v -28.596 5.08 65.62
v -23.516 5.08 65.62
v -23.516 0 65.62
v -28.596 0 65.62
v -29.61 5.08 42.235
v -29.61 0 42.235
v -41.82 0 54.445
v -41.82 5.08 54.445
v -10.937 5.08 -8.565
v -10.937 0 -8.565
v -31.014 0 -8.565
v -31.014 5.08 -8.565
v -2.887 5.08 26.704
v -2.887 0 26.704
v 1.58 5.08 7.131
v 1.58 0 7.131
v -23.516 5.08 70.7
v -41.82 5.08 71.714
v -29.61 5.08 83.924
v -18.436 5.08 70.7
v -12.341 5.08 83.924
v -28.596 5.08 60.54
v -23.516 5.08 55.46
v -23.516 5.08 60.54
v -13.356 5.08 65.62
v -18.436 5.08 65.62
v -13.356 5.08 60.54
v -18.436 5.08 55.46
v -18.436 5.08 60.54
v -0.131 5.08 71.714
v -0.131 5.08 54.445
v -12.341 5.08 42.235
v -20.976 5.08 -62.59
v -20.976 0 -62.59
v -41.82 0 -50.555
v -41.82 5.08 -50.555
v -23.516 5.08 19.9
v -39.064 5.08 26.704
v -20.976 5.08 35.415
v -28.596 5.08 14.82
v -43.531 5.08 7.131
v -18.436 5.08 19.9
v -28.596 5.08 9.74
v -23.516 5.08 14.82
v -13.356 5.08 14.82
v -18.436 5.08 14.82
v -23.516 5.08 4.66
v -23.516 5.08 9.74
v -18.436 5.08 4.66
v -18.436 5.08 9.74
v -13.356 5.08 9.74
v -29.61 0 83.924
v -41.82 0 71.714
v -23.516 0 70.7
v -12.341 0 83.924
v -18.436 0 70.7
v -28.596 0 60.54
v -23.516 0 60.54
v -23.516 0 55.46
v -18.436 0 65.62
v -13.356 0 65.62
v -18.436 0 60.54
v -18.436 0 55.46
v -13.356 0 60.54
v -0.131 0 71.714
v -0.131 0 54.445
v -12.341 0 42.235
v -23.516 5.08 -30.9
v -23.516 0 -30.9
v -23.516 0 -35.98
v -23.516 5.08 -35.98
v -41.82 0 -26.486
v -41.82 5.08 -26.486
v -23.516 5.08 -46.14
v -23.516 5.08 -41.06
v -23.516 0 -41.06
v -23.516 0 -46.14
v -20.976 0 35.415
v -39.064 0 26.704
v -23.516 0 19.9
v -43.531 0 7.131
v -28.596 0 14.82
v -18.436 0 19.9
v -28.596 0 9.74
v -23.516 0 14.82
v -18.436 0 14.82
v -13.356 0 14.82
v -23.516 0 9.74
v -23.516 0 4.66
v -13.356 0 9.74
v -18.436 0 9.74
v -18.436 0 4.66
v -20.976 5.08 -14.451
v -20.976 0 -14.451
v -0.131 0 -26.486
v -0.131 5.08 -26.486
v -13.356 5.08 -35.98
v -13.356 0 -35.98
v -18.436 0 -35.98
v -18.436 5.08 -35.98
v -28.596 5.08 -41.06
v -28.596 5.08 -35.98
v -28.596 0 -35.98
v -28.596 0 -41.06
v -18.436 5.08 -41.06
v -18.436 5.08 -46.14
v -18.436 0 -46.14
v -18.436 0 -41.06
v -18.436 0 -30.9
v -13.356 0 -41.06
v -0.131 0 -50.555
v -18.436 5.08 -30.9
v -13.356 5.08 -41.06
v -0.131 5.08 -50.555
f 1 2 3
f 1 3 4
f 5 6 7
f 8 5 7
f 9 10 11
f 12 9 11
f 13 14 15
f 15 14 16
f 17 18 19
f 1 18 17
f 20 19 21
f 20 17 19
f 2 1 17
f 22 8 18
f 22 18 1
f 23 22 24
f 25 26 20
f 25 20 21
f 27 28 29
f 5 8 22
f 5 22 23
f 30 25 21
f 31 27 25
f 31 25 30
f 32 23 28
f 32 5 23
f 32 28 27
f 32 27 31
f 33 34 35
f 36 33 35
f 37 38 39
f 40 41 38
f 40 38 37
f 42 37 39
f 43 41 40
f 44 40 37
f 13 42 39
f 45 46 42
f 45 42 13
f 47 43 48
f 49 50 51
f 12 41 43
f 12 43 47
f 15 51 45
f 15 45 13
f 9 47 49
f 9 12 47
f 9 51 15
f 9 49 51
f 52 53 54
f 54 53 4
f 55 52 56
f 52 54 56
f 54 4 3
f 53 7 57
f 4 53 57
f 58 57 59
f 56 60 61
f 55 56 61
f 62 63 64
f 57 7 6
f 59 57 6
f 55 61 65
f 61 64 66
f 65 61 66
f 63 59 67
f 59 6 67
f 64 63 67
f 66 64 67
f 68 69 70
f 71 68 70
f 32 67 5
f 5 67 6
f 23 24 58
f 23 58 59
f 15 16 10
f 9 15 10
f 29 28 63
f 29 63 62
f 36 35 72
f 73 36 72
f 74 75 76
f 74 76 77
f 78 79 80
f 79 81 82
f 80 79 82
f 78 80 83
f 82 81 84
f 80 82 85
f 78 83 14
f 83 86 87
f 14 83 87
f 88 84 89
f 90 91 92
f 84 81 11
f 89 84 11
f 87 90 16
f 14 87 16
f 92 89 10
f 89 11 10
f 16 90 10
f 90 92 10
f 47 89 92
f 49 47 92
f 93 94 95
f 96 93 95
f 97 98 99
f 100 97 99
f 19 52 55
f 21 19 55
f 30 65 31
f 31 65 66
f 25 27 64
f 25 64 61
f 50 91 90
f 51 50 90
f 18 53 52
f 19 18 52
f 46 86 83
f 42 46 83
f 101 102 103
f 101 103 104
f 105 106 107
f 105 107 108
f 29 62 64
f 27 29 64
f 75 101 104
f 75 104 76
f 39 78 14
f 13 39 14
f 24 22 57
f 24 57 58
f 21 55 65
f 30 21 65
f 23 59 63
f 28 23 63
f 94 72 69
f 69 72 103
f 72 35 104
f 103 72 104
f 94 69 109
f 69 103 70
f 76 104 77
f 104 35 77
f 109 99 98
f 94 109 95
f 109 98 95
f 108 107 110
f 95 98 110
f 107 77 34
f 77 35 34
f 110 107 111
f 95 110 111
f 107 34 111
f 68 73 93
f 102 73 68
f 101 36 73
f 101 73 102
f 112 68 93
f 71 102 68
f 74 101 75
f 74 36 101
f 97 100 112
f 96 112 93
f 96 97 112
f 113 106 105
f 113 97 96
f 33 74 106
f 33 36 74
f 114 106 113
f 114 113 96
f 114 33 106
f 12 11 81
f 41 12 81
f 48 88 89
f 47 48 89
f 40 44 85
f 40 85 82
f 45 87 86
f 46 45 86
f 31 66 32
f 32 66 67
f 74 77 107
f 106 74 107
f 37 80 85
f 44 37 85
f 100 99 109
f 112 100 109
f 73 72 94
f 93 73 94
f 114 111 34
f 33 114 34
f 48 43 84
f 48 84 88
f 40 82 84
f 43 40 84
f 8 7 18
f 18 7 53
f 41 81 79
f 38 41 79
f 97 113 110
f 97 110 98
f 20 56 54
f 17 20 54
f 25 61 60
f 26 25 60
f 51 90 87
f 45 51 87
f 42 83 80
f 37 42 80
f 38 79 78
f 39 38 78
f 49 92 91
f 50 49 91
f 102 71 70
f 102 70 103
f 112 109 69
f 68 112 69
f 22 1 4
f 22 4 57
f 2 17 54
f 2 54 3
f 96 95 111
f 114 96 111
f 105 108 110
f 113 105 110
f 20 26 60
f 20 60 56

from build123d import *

# Parameters (mm, degrees)
BOSS_EXTRUDE1_DEPTH   = 5.08
BOSS_EXTRUDE1_2_DEPTH = 5.08
BOSS_EXTRUDE1_3_DEPTH = 5.08


with BuildPart() as part:
    # Sketch1 → Boss-Extrude1 (new body)
    with BuildSketch(Plane(origin=(0, 0, 0), x_dir=(1, 0, 0), z_dir=(0, 1, 0))):
        Polygon((-20.97553446, 14.451323935), (-0.13102446, 26.485907395), (-0.13102446, 50.555074314), (-20.97553446, 62.589657774), (-41.82004446, 50.555074314), (-41.82004446, 26.485907395), align=None)
        Polygon((-20.97553446, 46.140490854), (-18.43553446, 46.140490854), (-18.43553446, 41.060490854), (-13.35553446, 41.060490854), (-13.35553446, 38.520490854), (-13.35553446, 35.980490854), (-18.43553446, 35.980490854), (-18.43553446, 30.900490854), (-20.97553446, 30.900490854), (-23.51553446, 30.900490854), (-23.51553446, 35.980490854), (-28.59553446, 35.980490854), (-28.59553446, 38.520490854), (-28.59553446, 41.060490854), (-23.51553446, 41.060490854), (-23.51553446, 46.140490854), align=None, mode=Mode.SUBTRACT)
    extrude(amount=BOSS_EXTRUDE1_DEPTH)


with BuildPart() as body_2:
    # Sketch1 → Boss-Extrude1 2 (new body)
    with BuildSketch(Plane(origin=(0, 0, 0), x_dir=(1, 0, 0), z_dir=(0, 1, 0))):
        Polygon((-20.97553446, -35.415169813), (-2.887346582, -26.704357631), (1.580066892, -7.131340326), (-10.937347503, 8.565000854), (-31.013721418, 8.565000854), (-43.531135812, -7.131340326), (-39.063722338, -26.704357631), align=None)
        Polygon((-23.51553446, -14.819509146), (-28.59553446, -14.819509146), (-28.59553446, -12.279509146), (-28.59553446, -9.739509146), (-23.51553446, -9.739509146), (-23.51553446, -4.659509146), (-20.97553446, -4.659509146), (-18.43553446, -4.659509146), (-18.43553446, -9.739509146), (-13.35553446, -9.739509146), (-13.35553446, -12.279509146), (-13.35553446, -14.819509146), (-18.43553446, -14.819509146), (-18.43553446, -19.899509146), (-20.97553446, -19.899509146), (-23.51553446, -19.899509146), align=None, mode=Mode.SUBTRACT)
    extrude(amount=BOSS_EXTRUDE1_2_DEPTH)


with BuildPart() as body_3:
    # Sketch1 → Boss-Extrude1 3 (new body)
    with BuildSketch(Plane(origin=(0, 0, 0), x_dir=(1, 0, 0), z_dir=(0, 1, 0))):
        Polygon((-12.341455717, -42.234999146), (-29.609613203, -42.234999146), (-41.82004446, -54.445430403), (-41.82004446, -71.713587889), (-29.609613203, -83.924019146), (-12.341455717, -83.924019146), (-0.13102446, -71.713587889), (-0.13102446, -54.445430403), align=None)
        Polygon((-18.43553446, -65.619509146), (-18.43553446, -70.699509146), (-20.97553446, -70.699509146), (-23.51553446, -70.699509146), (-23.51553446, -65.619509146), (-28.59553446, -65.619509146), (-28.59553446, -63.079509146), (-28.59553446, -60.539509146), (-23.51553446, -60.539509146), (-23.51553446, -55.459509146), (-20.97553446, -55.459509146), (-18.43553446, -55.459509146), (-18.43553446, -60.539509146), (-13.35553446, -60.539509146), (-13.35553446, -63.079509146), (-13.35553446, -65.619509146), align=None, mode=Mode.SUBTRACT)
    extrude(amount=BOSS_EXTRUDE1_3_DEPTH)


solid = Compound([part.part, body_2.part, body_3.part])
